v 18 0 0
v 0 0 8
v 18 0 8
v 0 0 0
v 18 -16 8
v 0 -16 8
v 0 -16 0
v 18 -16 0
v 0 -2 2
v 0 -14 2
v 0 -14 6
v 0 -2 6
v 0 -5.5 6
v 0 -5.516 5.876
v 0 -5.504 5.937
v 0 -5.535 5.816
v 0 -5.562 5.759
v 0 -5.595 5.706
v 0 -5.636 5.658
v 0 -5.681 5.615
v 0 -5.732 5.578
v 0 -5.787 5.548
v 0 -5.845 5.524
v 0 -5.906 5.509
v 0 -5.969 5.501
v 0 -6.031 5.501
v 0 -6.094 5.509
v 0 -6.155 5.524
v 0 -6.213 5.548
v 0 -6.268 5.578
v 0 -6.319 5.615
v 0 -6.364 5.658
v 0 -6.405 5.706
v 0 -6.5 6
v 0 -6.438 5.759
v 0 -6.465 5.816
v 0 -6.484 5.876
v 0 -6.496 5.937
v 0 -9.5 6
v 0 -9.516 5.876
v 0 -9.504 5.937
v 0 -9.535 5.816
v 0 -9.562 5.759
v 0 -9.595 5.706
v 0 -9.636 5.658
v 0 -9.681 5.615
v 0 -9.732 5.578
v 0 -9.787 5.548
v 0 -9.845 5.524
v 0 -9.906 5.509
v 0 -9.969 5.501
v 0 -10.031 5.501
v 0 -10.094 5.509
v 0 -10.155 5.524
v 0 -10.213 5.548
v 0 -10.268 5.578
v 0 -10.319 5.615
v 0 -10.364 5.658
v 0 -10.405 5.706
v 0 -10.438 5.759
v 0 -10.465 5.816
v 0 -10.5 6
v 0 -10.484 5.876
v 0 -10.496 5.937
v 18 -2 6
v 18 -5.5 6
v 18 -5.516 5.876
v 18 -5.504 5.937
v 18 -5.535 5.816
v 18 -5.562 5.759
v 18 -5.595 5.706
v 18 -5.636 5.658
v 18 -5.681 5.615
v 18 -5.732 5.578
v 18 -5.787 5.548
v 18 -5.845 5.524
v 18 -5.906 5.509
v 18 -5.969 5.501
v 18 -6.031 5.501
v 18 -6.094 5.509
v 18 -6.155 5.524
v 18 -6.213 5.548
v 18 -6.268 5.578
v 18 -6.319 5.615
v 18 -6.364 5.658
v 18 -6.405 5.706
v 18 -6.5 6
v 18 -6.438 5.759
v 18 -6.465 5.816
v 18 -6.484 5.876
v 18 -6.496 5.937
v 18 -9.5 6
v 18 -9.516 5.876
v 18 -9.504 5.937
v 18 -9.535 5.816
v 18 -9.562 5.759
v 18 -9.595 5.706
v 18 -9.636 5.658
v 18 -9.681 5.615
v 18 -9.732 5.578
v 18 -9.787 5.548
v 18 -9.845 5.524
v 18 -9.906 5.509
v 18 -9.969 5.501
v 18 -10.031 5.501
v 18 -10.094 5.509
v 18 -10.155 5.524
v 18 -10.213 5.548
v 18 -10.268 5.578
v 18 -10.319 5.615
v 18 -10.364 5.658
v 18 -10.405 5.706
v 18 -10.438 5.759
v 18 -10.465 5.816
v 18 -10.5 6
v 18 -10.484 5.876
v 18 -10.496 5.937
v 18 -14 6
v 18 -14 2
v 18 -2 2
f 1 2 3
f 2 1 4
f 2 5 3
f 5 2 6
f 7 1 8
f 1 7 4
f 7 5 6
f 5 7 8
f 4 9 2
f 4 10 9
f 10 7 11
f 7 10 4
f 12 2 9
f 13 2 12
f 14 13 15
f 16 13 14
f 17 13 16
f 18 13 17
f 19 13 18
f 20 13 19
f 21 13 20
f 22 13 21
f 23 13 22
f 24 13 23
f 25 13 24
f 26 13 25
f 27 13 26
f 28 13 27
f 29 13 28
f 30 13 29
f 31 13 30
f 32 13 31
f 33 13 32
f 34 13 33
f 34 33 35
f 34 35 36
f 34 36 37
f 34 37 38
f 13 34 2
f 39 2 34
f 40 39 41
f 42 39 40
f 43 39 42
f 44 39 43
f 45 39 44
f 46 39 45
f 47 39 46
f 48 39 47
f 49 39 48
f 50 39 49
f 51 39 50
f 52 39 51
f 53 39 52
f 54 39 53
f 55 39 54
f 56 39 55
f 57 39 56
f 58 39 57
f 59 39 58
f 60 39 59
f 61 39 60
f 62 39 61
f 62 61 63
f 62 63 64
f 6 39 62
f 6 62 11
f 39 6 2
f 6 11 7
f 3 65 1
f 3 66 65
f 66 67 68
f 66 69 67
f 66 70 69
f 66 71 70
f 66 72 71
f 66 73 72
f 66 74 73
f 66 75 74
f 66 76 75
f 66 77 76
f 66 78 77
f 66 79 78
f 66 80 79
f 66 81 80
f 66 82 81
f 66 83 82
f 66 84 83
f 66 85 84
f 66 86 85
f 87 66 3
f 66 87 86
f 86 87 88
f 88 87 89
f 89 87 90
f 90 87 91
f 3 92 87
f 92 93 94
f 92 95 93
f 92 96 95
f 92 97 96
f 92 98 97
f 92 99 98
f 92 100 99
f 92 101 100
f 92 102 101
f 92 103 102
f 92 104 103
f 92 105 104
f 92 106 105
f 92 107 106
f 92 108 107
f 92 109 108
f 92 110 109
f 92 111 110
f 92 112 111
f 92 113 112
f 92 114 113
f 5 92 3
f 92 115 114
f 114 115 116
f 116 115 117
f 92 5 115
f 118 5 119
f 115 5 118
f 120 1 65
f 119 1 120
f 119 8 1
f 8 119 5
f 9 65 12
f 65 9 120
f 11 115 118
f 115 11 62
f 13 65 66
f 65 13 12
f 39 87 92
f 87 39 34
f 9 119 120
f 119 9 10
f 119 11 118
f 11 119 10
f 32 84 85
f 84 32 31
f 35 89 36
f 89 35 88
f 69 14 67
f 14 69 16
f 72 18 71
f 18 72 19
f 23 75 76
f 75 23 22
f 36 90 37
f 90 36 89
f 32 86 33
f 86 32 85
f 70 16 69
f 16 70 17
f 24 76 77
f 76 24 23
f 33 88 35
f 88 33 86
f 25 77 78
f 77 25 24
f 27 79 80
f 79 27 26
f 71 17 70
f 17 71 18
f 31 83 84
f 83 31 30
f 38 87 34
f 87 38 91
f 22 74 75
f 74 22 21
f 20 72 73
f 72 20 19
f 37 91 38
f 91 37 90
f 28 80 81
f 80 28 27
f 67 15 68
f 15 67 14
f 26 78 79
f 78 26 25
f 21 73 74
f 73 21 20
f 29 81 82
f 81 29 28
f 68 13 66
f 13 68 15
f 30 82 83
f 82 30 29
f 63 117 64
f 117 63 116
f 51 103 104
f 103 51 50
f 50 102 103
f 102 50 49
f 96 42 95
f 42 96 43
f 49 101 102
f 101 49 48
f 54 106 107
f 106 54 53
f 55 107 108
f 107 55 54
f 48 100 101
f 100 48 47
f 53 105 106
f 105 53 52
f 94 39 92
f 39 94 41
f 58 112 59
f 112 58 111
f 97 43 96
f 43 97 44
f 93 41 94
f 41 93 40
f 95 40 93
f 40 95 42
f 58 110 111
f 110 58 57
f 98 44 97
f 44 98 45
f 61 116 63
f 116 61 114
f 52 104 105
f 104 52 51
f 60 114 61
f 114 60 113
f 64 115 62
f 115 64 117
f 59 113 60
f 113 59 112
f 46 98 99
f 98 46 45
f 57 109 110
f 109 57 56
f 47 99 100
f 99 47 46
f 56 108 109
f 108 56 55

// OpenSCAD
//translate([-40,1,-2]) import("hotshoe_a.stl", convexity=3);


rotate([0,0,90]) translate([-8,-9,4]) union(){
    difference(){
      cube([16,18,8],center = true);
      cube([12,18,4],center = true);
    };

    translate([2,0,2]) {rotate([90,0,0]) cylinder($fn=50, h=18,r=0.5,center = true);};
    translate([-2,0,2]) {rotate([90,0,0]) cylinder($fn=50, h=18,r=0.5,center = true);};
    
}
